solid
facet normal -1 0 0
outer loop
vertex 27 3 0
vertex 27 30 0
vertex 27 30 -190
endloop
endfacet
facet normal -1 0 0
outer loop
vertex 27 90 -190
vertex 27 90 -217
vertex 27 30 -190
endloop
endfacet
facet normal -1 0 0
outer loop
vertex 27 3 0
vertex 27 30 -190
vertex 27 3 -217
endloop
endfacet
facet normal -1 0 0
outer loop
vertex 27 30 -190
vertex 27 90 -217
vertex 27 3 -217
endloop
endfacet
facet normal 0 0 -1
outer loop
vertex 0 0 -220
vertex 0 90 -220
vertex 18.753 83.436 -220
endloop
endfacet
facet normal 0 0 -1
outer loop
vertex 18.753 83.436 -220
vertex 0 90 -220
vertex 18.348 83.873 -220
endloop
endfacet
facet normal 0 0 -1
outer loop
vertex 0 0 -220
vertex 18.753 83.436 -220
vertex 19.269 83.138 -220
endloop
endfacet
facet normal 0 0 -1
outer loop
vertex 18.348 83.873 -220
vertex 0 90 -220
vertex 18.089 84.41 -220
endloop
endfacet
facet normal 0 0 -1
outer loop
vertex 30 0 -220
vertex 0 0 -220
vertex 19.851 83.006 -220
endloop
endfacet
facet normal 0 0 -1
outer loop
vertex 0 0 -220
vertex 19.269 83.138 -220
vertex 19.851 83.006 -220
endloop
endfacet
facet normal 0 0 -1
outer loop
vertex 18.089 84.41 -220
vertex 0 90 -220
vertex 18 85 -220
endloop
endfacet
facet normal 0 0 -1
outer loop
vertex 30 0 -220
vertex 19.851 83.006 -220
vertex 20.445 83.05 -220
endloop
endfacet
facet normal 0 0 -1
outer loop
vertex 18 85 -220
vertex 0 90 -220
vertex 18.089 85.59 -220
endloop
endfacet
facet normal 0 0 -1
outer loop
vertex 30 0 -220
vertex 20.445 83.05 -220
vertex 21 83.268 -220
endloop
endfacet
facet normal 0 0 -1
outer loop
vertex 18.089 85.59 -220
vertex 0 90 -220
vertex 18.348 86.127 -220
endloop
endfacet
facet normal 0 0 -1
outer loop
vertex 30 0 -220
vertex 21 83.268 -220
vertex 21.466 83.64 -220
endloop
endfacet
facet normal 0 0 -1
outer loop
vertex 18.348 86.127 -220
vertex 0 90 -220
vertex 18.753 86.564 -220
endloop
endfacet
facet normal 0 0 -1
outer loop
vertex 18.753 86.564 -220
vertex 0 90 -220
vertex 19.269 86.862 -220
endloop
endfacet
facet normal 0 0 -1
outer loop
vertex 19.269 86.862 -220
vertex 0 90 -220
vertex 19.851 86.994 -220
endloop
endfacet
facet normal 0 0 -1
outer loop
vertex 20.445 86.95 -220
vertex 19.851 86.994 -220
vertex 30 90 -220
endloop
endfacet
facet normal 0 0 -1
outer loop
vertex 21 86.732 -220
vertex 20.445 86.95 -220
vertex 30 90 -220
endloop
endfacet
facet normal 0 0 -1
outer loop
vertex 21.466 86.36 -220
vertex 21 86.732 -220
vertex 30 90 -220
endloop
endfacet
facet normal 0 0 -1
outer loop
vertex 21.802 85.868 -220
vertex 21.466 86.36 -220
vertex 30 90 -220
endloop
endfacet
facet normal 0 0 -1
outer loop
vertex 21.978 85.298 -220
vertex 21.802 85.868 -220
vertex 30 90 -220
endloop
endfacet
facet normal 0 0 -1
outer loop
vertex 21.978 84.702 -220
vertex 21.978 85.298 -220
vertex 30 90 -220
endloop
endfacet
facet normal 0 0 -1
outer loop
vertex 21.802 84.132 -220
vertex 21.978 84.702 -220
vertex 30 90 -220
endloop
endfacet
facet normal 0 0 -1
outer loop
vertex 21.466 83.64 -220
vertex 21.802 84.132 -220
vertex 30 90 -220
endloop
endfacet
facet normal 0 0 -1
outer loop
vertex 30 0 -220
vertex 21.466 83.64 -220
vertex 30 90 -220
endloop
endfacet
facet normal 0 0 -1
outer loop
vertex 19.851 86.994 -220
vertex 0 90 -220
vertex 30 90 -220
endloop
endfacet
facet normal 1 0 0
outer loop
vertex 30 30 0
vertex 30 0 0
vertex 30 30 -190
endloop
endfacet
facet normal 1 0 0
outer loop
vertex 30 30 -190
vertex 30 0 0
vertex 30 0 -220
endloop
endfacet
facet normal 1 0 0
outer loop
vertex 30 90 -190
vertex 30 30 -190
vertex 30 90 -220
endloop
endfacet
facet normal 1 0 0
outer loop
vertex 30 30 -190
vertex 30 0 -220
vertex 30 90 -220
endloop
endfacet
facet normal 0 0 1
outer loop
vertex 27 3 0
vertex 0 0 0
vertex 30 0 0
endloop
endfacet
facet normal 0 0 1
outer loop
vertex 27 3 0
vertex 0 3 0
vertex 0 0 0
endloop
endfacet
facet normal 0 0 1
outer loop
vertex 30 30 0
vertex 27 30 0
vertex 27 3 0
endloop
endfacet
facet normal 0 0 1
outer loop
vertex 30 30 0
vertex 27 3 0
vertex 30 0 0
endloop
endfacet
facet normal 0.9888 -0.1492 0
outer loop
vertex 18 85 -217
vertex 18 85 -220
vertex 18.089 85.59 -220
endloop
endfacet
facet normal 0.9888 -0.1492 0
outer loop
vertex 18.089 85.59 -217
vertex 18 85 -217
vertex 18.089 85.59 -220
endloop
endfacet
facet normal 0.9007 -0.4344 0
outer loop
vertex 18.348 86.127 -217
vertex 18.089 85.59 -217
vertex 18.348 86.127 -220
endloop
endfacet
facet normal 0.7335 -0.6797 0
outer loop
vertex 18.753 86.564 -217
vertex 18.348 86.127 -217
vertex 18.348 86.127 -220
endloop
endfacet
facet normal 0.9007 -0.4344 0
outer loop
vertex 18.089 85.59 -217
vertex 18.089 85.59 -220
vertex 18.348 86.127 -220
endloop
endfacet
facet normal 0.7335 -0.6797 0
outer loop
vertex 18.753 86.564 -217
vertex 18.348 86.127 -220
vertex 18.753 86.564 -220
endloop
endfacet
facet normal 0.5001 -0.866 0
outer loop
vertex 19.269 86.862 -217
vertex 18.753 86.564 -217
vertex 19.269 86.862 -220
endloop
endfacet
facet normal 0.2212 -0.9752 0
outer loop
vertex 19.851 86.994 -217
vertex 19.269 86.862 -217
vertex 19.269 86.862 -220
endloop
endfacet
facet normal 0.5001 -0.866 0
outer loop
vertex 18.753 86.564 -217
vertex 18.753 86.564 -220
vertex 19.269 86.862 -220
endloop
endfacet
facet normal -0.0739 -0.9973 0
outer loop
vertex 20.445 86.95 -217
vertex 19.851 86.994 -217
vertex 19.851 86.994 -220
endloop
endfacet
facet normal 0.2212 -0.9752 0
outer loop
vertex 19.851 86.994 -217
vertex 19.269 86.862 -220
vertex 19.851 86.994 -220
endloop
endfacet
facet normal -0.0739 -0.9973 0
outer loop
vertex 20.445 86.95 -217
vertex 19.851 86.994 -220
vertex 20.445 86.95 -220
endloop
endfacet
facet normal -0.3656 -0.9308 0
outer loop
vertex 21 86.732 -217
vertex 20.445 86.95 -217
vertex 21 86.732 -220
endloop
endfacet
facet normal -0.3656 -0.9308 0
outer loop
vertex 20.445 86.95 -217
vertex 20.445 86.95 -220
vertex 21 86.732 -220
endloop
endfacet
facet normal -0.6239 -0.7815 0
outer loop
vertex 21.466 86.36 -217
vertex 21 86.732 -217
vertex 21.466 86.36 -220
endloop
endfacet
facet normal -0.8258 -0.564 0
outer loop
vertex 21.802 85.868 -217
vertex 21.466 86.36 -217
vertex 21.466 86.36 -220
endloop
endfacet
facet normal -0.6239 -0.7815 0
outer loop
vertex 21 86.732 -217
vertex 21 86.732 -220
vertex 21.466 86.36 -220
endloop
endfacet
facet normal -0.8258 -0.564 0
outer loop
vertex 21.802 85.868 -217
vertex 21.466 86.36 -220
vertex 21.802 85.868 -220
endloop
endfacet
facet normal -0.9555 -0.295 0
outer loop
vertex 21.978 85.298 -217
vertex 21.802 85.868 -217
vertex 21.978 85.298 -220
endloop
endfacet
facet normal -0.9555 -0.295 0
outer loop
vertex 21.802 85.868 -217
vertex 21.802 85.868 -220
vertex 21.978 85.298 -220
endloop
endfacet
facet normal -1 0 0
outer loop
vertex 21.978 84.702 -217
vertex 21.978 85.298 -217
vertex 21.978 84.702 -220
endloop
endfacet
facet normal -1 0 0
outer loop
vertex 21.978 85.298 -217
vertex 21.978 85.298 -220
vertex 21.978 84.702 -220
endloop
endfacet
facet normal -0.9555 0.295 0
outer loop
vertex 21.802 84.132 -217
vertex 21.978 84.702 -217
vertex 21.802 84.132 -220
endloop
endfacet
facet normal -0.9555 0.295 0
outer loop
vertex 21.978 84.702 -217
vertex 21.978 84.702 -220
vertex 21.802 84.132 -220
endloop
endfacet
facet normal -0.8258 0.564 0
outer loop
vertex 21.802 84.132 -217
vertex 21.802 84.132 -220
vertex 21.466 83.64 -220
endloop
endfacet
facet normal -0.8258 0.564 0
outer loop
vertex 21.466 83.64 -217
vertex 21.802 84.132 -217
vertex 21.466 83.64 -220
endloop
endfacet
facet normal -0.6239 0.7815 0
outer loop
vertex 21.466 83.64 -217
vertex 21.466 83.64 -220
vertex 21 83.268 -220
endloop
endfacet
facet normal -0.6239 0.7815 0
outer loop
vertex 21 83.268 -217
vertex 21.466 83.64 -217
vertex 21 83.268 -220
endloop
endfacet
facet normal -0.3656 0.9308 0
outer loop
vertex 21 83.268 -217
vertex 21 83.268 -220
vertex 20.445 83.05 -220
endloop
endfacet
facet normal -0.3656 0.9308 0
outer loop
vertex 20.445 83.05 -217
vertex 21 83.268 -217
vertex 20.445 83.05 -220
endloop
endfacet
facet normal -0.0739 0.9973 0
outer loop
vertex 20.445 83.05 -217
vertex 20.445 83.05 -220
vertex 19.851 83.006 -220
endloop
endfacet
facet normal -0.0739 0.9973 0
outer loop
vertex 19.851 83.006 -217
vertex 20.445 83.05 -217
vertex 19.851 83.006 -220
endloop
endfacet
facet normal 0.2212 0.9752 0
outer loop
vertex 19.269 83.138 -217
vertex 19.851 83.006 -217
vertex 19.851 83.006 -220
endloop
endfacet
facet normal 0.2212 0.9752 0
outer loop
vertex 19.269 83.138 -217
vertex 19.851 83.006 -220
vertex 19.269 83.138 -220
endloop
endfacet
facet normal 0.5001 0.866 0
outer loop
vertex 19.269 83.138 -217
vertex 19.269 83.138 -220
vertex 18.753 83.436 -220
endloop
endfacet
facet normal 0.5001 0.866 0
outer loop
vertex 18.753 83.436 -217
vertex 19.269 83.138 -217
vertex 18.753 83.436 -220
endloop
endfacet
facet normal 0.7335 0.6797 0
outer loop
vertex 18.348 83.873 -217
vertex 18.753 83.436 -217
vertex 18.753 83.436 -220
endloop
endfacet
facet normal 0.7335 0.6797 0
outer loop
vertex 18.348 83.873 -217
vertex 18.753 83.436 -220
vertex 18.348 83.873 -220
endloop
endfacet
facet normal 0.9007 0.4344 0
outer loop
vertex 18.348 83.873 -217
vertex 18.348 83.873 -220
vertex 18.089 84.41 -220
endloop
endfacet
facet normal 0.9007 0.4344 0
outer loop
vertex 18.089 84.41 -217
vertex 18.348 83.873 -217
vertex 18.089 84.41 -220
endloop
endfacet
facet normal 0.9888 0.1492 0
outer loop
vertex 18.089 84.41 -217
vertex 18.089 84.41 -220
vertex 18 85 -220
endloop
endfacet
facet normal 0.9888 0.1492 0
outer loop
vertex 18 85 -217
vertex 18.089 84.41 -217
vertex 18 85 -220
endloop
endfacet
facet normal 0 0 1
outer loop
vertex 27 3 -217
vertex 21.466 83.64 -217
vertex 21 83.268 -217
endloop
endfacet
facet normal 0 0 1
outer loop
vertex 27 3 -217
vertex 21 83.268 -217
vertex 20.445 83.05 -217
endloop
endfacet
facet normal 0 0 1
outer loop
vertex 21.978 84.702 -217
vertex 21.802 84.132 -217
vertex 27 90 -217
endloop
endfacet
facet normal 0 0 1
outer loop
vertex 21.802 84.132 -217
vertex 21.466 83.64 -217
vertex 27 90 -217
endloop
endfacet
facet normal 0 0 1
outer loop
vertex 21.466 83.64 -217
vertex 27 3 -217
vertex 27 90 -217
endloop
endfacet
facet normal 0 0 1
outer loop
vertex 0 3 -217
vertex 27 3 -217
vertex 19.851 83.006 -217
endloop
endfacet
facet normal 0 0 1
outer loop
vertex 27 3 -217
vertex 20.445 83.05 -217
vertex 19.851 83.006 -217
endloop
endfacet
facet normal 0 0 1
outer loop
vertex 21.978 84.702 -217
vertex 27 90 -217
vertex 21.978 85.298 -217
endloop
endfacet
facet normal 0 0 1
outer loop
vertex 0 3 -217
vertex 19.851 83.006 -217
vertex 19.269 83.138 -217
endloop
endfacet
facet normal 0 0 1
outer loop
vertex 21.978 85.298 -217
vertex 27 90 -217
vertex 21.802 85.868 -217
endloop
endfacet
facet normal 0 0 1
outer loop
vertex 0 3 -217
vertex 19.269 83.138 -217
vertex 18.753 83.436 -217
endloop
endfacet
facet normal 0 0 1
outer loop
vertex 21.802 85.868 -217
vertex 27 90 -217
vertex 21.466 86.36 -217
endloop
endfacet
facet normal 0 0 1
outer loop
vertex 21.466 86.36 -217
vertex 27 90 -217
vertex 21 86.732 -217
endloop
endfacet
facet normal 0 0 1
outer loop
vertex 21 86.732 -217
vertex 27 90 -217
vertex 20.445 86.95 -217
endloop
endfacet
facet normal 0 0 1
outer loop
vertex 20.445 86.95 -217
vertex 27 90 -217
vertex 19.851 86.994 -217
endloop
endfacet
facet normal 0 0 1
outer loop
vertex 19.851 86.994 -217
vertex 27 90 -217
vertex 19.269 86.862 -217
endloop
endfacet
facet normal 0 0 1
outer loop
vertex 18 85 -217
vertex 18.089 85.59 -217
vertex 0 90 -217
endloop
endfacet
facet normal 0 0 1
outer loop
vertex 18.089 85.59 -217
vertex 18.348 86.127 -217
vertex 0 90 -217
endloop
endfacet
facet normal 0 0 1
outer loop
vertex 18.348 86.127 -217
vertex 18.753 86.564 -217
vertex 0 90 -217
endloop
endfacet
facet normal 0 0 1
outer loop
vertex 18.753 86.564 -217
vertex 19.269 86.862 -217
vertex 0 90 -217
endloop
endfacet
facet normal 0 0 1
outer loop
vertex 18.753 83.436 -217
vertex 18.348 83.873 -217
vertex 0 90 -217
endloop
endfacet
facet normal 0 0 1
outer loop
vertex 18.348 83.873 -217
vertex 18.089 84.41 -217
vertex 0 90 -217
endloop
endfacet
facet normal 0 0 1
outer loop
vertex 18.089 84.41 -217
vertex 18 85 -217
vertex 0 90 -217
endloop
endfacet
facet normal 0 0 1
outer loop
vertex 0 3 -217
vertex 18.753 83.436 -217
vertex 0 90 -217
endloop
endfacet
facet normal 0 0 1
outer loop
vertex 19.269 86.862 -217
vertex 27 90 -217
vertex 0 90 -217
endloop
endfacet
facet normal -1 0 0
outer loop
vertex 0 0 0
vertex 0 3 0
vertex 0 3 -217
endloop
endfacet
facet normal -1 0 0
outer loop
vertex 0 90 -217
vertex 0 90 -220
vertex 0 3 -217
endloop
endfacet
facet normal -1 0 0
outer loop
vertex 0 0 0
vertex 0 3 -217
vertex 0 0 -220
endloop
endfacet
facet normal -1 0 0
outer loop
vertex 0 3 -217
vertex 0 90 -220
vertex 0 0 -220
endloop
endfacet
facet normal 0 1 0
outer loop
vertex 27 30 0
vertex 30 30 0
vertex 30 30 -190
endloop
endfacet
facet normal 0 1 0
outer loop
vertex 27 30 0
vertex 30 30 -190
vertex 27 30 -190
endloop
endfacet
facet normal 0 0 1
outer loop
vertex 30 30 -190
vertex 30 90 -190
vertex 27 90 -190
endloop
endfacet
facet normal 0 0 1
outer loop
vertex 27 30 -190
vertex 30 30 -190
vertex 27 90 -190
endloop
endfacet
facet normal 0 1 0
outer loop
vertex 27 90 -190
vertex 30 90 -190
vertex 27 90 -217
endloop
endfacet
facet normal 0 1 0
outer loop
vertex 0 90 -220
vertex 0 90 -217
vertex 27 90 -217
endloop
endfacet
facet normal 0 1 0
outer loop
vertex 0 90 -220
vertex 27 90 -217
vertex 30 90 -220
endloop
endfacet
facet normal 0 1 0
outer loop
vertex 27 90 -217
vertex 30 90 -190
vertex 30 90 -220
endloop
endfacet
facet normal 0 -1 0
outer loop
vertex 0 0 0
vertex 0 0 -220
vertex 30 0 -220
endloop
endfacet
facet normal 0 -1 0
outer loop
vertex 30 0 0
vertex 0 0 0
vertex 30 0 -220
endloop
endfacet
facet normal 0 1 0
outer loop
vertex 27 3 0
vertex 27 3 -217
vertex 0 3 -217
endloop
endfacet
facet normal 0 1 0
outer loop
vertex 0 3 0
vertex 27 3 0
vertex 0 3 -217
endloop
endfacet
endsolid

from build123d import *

# Parameters (mm, degrees)
SKETCH7_R          = 2
CUT_EXTRUDE1_DEPTH = 10


with BuildPart() as part:
    # Sweep1: sweep along a path in Sketch4
    with BuildLine(Plane(origin=(0, 0, 0), x_dir=(0, 0, -1), z_dir=(1, 0, 0))) as sweep1_path:
        Line((0, 0), (220, 0))
        Line((220, 0), (220, 90))
    # Sketch2 → Sweep1 (sweep)
    with BuildSketch(Plane.XY):
        Polygon((0, 0), (30, 0), (30, 30), (27, 30), (27, 3), (0, 3), align=None)
    sweep(path=sweep1_path.line, transition=Transition.RIGHT)

    # Sketch7 → Cut-Extrude1 (cut)
    with BuildSketch(Plane(origin=(0, 0, -220), x_dir=(-1, 0, 0), z_dir=(0, 0, -1))):
        with Locations((-20, 85)):
            Circle(SKETCH7_R)
    extrude(amount=-CUT_EXTRUDE1_DEPTH, mode=Mode.SUBTRACT)


solid = part.part
